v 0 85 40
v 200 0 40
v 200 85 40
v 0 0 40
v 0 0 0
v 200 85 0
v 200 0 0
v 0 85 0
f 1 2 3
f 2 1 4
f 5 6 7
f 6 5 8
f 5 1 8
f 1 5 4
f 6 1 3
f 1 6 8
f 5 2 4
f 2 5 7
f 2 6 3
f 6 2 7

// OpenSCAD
POWER_SUPPLY_LENGTH=150;
POWER_SUPPLY_WIDTH=85;
POWER_SUPPLY_HEIGHT=40;
POWER_SUPPLY_CABLE_SLACK=50;
module power_supply() {
    color("blue"){
		cube([POWER_SUPPLY_LENGTH, POWER_SUPPLY_WIDTH, POWER_SUPPLY_HEIGHT]);
	}
	power_supply_cable_slack();
}

module power_supply_cable_slack() {
	color("red"){
		translate([POWER_SUPPLY_LENGTH, 0, 0])
			cube([POWER_SUPPLY_CABLE_SLACK, POWER_SUPPLY_WIDTH, POWER_SUPPLY_HEIGHT]);
	}
}
power_supply();
